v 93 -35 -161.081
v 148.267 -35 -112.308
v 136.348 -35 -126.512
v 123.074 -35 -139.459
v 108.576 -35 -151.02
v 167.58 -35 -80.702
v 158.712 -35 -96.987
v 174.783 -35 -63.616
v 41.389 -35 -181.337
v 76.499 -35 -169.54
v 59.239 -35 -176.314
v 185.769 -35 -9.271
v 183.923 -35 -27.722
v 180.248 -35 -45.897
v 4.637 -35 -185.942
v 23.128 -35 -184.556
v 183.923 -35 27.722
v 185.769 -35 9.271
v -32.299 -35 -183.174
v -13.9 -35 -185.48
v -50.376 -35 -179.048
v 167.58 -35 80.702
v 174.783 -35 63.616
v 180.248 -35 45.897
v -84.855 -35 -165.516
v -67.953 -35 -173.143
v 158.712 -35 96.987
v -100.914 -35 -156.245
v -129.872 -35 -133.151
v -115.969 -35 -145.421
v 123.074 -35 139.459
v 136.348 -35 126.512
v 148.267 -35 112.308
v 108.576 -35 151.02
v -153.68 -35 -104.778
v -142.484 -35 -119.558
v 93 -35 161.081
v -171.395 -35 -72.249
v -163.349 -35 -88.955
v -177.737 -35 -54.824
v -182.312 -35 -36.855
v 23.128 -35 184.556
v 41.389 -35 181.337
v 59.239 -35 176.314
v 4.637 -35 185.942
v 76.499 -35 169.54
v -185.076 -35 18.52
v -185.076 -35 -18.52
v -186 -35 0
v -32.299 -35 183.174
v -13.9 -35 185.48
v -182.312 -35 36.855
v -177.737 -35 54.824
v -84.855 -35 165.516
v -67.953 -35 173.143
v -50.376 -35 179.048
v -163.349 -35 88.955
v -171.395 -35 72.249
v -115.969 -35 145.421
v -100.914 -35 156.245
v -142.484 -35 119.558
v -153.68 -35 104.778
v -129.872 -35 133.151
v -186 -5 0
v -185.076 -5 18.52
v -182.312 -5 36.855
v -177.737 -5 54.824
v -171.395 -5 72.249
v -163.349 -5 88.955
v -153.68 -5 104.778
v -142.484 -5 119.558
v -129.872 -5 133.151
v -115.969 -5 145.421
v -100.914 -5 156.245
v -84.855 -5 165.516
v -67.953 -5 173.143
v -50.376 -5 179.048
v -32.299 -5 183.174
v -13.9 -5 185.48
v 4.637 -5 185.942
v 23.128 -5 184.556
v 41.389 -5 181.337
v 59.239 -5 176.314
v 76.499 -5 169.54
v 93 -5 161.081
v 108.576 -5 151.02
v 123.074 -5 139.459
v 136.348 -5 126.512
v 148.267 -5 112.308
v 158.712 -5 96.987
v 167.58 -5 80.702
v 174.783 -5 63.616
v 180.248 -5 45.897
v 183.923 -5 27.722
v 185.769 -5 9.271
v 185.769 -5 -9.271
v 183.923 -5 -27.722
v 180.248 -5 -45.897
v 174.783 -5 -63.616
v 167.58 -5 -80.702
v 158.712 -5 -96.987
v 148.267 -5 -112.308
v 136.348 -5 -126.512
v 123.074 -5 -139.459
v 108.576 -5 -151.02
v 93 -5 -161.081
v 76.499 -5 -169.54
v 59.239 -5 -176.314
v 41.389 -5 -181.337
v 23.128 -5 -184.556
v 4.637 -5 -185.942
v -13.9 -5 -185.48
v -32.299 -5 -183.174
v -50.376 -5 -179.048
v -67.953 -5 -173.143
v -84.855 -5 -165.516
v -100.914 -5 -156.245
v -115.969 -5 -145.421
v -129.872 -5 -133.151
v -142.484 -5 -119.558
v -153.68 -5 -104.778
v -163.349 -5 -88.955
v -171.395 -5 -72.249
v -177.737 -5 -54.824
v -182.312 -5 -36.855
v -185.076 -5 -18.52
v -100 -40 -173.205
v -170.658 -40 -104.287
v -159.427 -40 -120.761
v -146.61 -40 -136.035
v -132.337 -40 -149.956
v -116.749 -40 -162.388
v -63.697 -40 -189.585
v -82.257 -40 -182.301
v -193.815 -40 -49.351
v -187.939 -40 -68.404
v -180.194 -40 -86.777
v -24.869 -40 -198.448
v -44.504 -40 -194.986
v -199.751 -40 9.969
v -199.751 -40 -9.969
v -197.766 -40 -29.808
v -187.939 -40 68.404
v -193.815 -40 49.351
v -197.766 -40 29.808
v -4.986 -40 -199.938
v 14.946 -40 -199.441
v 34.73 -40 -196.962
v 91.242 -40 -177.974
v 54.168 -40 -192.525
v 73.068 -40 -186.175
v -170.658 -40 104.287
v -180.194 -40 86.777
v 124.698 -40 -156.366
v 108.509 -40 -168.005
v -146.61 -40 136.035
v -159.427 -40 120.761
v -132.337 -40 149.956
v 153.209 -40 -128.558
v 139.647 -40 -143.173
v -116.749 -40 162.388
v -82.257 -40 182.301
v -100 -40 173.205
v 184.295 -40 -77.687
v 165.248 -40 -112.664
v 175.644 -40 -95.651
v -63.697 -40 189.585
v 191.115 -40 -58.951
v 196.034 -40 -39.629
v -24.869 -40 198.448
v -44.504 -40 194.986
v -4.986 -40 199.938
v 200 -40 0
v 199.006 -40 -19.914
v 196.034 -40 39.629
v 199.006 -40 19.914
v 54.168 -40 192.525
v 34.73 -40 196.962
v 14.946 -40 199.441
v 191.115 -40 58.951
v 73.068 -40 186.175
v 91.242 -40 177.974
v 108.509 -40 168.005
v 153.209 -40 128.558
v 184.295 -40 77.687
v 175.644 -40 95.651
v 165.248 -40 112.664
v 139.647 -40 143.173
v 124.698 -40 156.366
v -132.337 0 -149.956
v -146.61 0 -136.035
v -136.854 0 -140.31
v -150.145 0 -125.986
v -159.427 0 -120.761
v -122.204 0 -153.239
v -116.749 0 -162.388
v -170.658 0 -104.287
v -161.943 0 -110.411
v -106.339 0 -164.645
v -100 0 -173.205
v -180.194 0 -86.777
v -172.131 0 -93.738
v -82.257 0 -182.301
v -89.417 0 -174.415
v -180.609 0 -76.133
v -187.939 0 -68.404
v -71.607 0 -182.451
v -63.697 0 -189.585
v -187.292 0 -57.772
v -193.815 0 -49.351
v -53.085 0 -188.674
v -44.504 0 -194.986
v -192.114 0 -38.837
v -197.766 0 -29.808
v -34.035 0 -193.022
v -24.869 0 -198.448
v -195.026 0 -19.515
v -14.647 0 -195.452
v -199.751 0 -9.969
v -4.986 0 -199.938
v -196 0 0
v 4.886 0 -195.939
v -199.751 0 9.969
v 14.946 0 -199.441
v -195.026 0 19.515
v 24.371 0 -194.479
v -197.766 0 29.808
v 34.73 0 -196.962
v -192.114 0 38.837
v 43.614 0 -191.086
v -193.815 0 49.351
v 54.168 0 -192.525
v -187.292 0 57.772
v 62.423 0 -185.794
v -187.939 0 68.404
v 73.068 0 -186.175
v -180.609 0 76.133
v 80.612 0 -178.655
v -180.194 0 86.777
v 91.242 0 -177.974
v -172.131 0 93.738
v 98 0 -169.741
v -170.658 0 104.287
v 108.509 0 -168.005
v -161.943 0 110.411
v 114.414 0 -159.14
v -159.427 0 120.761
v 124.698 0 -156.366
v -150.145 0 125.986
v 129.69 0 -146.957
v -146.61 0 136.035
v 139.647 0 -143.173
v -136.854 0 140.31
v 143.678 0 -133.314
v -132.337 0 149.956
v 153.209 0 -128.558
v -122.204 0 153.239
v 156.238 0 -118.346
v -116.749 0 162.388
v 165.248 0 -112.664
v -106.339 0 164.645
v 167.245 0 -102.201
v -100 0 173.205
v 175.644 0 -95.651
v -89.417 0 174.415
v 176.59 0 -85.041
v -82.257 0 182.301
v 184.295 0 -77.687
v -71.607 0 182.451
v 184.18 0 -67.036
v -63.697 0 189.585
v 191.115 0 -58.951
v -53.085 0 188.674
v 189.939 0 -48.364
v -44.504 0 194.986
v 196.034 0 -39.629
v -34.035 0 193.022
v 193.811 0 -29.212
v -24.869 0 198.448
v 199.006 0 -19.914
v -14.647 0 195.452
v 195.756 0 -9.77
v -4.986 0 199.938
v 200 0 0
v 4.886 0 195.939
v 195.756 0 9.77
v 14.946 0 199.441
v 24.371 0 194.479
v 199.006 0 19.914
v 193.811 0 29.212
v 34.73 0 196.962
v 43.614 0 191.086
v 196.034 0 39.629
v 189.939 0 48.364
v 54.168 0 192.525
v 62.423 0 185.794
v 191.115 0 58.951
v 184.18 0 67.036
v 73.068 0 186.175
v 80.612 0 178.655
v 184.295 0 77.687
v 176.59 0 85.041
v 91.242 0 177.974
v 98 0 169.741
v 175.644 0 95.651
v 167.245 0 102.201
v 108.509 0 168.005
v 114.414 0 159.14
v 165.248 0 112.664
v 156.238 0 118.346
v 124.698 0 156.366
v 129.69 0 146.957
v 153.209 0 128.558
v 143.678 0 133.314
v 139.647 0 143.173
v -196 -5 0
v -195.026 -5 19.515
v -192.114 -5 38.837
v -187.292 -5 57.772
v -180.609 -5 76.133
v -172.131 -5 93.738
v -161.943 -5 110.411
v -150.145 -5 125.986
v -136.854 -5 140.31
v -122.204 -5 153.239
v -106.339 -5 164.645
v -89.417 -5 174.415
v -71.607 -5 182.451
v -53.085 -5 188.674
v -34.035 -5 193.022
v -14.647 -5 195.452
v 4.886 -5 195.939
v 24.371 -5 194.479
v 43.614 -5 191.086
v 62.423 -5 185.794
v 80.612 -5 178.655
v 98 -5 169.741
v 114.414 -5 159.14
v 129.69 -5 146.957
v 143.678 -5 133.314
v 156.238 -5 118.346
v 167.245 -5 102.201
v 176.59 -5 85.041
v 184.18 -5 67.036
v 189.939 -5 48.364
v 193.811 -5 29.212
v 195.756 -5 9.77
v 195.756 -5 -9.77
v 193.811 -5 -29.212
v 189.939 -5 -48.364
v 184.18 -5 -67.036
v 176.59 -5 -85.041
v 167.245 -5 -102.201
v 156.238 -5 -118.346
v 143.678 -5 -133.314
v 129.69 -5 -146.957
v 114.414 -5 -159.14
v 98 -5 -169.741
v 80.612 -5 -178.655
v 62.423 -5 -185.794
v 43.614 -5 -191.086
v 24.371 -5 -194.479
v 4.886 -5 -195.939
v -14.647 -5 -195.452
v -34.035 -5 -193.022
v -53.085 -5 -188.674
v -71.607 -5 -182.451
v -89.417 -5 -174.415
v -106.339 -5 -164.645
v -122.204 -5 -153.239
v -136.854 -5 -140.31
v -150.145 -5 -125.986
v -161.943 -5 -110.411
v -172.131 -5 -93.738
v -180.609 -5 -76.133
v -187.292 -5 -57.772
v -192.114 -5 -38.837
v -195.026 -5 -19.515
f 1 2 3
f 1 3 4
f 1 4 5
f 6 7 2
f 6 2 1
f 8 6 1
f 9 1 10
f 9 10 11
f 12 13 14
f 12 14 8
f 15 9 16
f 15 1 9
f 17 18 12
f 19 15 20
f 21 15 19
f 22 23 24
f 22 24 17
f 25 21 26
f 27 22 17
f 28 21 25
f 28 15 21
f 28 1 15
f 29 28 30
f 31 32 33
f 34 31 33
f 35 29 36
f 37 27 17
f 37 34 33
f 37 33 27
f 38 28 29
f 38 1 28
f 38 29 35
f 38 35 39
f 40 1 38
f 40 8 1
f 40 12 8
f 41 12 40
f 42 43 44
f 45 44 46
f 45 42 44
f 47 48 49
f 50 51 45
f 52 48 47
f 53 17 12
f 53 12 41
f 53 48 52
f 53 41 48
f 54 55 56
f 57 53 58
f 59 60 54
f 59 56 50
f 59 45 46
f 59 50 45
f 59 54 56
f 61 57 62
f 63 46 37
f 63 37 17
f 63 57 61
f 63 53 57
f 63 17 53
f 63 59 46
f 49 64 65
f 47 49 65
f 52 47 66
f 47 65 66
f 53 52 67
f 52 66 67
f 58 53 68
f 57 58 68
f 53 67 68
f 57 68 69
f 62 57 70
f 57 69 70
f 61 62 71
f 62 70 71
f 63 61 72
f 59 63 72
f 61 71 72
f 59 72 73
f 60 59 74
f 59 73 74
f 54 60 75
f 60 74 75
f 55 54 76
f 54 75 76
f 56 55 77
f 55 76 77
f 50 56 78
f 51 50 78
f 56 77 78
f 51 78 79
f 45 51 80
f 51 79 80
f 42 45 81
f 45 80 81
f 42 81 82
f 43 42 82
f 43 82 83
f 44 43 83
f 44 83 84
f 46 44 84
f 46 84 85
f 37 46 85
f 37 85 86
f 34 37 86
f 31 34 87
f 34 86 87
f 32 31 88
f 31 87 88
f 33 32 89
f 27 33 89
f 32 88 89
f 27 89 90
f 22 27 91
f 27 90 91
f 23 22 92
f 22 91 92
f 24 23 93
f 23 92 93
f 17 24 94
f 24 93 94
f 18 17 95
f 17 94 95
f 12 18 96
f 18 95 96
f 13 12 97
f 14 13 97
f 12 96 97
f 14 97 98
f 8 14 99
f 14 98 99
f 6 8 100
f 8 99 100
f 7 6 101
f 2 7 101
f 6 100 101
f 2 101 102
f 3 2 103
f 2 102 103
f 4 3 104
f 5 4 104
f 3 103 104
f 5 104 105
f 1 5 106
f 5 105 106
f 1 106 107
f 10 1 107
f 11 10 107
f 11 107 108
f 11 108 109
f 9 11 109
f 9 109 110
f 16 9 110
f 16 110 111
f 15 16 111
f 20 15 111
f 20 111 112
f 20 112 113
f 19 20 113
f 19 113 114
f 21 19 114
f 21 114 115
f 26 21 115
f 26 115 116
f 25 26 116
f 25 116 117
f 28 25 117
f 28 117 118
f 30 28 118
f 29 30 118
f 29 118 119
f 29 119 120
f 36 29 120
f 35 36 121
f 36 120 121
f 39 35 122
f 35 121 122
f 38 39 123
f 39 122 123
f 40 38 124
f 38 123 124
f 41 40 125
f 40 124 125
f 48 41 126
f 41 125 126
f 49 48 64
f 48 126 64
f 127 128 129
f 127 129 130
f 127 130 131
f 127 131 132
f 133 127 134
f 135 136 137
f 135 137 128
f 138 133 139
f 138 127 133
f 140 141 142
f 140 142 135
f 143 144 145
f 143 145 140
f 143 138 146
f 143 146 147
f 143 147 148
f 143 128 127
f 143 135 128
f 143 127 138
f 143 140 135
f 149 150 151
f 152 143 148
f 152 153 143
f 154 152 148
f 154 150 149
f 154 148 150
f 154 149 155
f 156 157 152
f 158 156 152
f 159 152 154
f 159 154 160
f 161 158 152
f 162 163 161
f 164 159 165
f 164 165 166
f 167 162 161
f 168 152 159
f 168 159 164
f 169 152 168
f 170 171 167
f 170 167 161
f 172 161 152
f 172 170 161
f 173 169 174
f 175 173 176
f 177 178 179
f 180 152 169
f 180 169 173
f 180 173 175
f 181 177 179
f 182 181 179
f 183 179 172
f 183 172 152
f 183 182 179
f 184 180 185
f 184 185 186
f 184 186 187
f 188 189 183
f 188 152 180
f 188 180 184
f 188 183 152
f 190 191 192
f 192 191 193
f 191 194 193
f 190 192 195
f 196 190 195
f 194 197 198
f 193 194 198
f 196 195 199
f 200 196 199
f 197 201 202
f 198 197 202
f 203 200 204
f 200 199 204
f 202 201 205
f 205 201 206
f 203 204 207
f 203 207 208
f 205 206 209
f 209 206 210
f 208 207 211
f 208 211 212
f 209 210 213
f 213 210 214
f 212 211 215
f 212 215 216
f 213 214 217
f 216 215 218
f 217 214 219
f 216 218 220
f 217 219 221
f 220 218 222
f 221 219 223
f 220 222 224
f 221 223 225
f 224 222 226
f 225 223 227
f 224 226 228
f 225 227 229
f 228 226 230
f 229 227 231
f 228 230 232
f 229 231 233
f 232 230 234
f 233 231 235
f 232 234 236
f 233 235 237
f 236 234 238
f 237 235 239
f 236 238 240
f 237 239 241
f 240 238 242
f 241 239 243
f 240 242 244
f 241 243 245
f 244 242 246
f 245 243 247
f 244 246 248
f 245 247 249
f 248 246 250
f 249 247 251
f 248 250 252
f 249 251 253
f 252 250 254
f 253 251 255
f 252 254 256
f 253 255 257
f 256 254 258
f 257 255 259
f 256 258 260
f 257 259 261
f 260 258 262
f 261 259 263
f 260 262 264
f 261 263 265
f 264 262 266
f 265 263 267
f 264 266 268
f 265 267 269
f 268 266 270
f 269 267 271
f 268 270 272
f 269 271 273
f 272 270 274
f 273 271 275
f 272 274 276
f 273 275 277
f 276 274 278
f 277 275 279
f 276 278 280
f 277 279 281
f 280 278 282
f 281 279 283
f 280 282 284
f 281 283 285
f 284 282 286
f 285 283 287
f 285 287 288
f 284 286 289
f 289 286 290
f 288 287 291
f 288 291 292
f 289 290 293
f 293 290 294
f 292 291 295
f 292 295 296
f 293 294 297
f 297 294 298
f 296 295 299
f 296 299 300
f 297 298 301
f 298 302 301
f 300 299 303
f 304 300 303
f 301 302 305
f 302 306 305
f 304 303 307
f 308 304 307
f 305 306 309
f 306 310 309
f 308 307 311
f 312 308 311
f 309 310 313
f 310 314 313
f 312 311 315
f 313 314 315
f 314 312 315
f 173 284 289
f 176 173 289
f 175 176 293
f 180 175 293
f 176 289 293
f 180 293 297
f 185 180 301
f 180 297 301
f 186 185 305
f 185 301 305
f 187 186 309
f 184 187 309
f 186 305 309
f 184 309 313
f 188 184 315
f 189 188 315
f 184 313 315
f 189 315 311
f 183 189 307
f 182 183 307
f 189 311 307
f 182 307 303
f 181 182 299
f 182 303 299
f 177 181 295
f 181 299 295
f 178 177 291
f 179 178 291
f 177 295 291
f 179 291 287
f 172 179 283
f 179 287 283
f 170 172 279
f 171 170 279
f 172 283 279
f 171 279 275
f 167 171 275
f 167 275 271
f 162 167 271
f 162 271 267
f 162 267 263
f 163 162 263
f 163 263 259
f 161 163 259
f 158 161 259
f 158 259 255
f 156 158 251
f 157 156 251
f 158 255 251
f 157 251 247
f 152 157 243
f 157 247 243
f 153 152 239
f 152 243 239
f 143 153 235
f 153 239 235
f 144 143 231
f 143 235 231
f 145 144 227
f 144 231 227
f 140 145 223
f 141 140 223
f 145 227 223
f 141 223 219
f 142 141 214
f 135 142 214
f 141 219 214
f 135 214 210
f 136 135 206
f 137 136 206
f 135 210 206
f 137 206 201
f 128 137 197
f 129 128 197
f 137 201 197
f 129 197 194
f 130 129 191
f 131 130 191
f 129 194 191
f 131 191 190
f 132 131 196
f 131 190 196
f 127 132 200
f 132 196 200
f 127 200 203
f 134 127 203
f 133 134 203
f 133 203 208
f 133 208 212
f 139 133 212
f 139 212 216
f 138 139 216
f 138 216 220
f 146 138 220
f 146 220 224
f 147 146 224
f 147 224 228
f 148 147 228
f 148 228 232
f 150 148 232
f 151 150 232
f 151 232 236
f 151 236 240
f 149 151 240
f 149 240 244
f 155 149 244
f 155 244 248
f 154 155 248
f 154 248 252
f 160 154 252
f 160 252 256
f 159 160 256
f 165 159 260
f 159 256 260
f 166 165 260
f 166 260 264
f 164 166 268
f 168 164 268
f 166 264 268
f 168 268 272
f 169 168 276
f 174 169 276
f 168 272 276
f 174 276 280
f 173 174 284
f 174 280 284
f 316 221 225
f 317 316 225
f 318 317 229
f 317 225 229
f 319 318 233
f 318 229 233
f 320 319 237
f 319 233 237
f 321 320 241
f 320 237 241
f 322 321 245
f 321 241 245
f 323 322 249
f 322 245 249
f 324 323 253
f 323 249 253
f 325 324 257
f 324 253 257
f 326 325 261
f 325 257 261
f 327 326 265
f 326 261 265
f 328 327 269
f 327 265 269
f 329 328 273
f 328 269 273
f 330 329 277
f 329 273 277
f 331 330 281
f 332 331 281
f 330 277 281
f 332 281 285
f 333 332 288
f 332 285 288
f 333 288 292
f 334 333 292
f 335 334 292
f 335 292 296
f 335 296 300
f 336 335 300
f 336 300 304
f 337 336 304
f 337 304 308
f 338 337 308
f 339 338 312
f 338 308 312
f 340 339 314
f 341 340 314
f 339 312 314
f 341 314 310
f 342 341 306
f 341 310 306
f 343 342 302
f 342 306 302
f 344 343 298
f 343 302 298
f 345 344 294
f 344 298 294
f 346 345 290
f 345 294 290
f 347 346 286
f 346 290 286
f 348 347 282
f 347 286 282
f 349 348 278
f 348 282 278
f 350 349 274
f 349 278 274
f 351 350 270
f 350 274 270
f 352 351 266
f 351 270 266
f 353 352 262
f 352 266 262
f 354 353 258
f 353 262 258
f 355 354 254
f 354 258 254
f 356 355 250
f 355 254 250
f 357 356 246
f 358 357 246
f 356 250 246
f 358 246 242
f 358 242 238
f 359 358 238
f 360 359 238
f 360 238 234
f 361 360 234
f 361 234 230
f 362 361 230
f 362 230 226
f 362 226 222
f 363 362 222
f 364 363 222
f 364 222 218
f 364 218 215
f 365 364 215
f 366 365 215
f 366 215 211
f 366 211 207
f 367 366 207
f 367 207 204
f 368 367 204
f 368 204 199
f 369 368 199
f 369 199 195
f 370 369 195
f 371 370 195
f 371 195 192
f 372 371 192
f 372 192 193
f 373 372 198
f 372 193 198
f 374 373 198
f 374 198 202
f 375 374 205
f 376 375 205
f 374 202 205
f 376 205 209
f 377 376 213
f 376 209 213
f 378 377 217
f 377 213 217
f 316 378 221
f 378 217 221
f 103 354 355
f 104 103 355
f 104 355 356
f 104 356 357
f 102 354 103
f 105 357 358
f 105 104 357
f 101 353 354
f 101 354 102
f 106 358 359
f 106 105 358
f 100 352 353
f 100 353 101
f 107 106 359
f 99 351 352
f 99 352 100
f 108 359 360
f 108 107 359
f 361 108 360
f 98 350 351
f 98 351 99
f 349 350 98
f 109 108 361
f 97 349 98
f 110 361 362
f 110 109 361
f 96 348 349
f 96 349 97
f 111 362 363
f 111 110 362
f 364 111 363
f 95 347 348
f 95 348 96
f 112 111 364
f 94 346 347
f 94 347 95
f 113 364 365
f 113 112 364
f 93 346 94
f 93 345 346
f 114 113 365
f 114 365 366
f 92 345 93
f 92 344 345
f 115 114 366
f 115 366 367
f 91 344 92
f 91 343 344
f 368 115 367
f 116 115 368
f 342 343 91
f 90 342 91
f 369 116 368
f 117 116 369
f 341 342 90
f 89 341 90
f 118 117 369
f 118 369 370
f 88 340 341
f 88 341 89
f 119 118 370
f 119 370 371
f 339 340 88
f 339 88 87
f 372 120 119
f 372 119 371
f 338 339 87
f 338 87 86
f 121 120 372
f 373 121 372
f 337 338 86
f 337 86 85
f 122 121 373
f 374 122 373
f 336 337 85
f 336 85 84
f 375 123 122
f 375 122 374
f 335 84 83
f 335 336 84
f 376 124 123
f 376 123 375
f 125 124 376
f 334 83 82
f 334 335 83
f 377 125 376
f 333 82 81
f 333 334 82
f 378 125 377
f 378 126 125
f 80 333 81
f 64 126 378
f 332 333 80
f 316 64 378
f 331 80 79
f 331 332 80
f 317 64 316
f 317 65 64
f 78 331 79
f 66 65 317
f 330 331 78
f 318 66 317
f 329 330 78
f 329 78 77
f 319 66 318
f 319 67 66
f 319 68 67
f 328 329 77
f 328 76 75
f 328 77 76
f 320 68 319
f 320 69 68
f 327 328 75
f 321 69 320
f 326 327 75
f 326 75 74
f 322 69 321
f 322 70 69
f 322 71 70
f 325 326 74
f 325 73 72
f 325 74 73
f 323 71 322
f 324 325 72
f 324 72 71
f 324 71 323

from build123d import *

# Parameters (mm, degrees)
F0_R     = 200
F1_DEPTH = 40
F2_R     = 196
F4_DEPTH = 5
F5_R     = 186
F6_DEPTH = 30


with BuildPart() as f1:
    # F0 (on Front) → F1 (new body)
    with BuildSketch(Plane.XZ):
        Circle(F0_R)
    extrude(amount=F1_DEPTH)

    # F2 (on face) → F4 (cut)
    with BuildSketch(Plane(origin=(0, 0, 0), x_dir=(-1, 0, 0), z_dir=(0, 1, 0))):
        Circle(F2_R)
    extrude(amount=-F4_DEPTH, mode=Mode.SUBTRACT)

    # F5 (on face) → F6 (cut)
    with BuildSketch(Plane(origin=(0, -5, 0), x_dir=(-1, 0, 0), z_dir=(0, 1, 0))):
        Circle(F5_R)
    extrude(amount=-F6_DEPTH, mode=Mode.SUBTRACT)


solid = f1.part
